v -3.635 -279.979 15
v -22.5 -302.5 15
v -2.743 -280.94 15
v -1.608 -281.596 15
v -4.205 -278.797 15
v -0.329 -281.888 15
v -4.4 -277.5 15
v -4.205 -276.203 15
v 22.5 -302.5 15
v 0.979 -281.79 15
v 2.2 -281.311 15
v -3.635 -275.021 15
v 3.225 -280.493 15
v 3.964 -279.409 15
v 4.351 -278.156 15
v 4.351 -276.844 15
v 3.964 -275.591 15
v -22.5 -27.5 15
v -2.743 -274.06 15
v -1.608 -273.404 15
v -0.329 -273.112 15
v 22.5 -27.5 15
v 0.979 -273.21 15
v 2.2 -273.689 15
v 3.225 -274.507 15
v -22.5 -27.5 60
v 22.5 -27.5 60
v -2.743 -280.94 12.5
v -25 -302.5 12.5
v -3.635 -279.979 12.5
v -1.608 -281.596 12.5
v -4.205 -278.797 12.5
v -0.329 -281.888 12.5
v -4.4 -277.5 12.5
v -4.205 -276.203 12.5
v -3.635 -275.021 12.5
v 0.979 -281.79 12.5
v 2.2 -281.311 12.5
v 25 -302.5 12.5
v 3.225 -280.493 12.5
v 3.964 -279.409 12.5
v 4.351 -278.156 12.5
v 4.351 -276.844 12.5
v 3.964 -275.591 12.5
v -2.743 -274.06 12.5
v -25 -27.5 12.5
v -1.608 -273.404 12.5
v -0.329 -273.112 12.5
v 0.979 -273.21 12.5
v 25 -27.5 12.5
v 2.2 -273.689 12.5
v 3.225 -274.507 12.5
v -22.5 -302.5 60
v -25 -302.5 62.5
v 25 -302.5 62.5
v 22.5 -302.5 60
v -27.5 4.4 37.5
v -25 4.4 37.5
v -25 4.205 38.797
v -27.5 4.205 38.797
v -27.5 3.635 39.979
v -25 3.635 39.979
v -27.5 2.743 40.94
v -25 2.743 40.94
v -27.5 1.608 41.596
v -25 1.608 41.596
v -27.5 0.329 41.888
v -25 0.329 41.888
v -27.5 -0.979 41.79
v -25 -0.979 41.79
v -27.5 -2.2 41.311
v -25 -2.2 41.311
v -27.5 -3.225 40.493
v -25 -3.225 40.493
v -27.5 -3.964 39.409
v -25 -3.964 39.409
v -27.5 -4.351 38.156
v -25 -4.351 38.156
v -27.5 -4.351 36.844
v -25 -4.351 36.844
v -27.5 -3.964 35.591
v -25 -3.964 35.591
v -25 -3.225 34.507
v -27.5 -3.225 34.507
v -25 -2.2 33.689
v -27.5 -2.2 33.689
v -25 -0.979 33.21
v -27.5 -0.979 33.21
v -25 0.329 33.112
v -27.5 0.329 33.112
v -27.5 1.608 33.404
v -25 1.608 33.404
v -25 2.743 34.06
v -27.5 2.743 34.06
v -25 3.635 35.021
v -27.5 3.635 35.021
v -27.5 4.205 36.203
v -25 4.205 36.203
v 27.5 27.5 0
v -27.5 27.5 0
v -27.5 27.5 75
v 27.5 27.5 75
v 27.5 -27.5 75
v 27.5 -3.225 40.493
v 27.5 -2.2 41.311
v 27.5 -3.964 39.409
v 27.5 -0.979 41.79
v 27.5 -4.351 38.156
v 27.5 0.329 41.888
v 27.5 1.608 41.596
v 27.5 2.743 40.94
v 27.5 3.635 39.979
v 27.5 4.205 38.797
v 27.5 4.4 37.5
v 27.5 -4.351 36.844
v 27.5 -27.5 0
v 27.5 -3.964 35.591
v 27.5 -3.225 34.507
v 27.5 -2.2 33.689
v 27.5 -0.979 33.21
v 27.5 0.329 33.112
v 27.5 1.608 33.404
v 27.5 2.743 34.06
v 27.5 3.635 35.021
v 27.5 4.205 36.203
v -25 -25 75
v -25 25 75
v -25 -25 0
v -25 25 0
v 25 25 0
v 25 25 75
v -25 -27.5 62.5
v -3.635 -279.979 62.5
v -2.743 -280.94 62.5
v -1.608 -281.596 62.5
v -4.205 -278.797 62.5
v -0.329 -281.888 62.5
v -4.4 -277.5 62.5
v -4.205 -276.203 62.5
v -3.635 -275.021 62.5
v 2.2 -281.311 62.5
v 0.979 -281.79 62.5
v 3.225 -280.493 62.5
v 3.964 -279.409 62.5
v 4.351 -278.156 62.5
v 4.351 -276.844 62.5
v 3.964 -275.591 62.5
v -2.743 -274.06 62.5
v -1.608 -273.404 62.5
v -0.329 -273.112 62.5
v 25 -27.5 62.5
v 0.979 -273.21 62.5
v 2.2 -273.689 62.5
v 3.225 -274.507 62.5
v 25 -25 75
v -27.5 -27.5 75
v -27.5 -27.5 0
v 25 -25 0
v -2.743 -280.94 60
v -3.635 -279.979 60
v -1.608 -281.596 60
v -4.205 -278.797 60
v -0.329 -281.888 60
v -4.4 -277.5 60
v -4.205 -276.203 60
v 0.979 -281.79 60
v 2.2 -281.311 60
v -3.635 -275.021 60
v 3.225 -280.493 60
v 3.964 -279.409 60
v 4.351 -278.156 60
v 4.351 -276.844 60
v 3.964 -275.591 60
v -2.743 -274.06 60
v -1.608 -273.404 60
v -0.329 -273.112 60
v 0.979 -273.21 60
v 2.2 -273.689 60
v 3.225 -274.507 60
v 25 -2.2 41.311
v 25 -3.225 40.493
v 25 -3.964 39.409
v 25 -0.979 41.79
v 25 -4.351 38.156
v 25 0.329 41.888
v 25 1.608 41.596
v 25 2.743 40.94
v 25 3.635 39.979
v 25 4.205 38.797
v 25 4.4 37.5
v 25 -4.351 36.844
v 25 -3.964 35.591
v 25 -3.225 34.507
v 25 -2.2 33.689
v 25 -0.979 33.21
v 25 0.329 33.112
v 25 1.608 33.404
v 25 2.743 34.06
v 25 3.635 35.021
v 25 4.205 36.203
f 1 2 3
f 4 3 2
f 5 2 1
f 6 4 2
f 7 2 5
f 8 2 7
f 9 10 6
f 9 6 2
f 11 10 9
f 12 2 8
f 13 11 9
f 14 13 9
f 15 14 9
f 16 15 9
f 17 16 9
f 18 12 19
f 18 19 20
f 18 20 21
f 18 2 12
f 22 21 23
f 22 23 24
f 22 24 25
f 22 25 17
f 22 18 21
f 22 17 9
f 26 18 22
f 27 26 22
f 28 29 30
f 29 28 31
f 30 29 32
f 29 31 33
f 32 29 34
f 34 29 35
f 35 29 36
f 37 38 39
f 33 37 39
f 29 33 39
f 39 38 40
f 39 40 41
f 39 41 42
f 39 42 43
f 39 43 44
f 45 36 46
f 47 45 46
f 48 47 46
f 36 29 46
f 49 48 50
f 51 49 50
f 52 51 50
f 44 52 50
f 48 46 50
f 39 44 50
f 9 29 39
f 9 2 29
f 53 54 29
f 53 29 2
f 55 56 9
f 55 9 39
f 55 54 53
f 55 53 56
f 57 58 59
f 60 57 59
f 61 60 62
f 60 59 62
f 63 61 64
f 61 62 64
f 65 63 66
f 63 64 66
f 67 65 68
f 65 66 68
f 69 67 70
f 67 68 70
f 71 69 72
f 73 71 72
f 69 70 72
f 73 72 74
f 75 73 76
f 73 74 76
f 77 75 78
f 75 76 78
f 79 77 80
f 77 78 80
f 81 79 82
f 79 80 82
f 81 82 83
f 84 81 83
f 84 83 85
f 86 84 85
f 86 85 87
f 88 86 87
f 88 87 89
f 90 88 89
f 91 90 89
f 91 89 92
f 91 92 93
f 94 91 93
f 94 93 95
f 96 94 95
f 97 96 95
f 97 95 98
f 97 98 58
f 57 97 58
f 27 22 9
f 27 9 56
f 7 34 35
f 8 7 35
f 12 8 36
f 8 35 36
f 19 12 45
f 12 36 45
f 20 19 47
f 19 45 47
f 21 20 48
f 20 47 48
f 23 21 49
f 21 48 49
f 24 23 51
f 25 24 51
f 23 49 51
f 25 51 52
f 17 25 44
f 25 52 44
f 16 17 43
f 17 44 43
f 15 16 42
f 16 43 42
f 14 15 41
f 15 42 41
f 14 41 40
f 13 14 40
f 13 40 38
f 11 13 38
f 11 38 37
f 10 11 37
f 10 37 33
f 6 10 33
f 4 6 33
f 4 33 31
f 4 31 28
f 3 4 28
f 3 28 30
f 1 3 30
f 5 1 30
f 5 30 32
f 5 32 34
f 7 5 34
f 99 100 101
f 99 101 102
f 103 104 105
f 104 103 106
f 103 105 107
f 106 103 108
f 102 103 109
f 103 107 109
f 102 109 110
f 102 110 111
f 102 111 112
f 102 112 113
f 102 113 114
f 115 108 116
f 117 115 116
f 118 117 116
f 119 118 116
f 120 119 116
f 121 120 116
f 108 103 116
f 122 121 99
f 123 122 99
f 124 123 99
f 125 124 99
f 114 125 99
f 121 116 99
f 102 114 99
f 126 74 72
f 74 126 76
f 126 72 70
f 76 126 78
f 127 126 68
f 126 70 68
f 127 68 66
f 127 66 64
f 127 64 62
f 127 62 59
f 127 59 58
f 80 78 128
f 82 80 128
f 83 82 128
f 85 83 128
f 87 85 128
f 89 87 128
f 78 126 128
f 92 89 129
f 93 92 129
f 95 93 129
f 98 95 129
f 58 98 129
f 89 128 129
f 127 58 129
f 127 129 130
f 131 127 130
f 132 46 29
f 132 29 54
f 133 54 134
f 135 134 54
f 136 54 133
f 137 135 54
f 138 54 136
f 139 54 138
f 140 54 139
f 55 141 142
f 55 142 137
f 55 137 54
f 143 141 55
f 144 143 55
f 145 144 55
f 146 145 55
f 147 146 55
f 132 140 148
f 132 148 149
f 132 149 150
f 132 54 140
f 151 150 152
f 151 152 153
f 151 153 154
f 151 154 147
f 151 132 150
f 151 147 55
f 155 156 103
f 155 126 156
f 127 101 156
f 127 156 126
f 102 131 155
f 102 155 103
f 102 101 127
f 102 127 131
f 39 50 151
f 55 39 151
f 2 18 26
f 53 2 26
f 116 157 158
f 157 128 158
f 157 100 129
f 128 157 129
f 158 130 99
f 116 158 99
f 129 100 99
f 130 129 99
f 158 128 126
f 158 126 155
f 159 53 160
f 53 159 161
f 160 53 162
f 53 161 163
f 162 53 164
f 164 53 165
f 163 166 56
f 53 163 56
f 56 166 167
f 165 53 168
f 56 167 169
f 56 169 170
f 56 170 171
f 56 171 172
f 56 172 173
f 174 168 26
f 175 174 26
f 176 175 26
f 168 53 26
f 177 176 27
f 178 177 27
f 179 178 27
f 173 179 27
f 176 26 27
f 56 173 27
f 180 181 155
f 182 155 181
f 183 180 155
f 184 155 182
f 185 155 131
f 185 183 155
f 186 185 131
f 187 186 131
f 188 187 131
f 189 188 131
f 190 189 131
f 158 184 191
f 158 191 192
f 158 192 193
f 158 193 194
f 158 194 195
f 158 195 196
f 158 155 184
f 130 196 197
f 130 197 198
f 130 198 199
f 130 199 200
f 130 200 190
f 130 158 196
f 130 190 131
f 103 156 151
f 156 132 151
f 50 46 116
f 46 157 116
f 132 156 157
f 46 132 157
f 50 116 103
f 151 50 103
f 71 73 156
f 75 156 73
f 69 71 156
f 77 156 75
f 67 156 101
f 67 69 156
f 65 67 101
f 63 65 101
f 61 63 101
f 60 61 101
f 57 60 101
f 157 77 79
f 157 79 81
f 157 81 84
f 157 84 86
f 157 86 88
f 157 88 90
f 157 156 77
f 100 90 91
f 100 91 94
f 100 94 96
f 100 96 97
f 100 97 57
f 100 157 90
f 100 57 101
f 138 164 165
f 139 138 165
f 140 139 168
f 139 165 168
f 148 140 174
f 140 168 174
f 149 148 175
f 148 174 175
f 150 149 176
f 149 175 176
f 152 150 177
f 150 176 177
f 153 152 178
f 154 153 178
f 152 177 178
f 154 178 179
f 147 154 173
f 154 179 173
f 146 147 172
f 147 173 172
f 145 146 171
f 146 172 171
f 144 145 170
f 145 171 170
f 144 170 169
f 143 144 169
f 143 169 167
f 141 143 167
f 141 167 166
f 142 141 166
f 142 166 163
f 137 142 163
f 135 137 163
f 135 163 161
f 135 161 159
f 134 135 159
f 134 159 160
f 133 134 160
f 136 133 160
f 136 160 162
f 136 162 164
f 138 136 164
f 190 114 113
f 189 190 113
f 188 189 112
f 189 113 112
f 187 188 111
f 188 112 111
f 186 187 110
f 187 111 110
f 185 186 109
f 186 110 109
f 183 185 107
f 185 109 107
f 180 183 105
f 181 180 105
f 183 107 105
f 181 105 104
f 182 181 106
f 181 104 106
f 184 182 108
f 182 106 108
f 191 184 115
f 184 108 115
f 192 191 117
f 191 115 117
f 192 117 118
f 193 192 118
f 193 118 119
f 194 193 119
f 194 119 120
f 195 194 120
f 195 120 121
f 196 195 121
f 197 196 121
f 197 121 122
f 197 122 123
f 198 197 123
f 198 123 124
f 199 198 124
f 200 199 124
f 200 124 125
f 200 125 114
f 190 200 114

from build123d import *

# Parameters (mm, degrees)
F0_W     = 55
F0_H     = 55
F0_W_2   = 50
F0_H_2   = 50
F1_DEPTH = 75
F3_D     = 8.8
F4_W     = 50
F4_H     = 50
F4_W_2   = 45
F4_H_2   = 45
F5_DEPTH = 275
F7_D     = 8.8


with BuildPart() as f1:
    # F0 (on Top) → F1 (new body)
    with BuildSketch(Plane.XY):
        Rectangle(F0_W, F0_H)
        Rectangle(F0_W_2, F0_H_2, mode=Mode.SUBTRACT)
    extrude(amount=F1_DEPTH)

    # F3 (through all)
    with Locations(Plane(origin=(-27.5, 0, 0), x_dir=(0, -1, 0), z_dir=(-1, 0, 0))):
        with Locations((0, 37.5)):
            Hole(F3_D / 2)

    # F4 (on face) → F5 (join)
    with BuildSketch(Plane.XZ.offset(27.5)):
        with Locations((0, 37.5)):
            Rectangle(F4_W, F4_H)
        with Locations((0, 37.5)):
            Rectangle(F4_W_2, F4_H_2, mode=Mode.SUBTRACT)
    extrude(amount=F5_DEPTH)

    # F7 (through all)
    with Locations(Plane.XY.offset(62.5)):
        with Locations((0, -277.5)):
            Hole(F7_D / 2)


solid = f1.part
